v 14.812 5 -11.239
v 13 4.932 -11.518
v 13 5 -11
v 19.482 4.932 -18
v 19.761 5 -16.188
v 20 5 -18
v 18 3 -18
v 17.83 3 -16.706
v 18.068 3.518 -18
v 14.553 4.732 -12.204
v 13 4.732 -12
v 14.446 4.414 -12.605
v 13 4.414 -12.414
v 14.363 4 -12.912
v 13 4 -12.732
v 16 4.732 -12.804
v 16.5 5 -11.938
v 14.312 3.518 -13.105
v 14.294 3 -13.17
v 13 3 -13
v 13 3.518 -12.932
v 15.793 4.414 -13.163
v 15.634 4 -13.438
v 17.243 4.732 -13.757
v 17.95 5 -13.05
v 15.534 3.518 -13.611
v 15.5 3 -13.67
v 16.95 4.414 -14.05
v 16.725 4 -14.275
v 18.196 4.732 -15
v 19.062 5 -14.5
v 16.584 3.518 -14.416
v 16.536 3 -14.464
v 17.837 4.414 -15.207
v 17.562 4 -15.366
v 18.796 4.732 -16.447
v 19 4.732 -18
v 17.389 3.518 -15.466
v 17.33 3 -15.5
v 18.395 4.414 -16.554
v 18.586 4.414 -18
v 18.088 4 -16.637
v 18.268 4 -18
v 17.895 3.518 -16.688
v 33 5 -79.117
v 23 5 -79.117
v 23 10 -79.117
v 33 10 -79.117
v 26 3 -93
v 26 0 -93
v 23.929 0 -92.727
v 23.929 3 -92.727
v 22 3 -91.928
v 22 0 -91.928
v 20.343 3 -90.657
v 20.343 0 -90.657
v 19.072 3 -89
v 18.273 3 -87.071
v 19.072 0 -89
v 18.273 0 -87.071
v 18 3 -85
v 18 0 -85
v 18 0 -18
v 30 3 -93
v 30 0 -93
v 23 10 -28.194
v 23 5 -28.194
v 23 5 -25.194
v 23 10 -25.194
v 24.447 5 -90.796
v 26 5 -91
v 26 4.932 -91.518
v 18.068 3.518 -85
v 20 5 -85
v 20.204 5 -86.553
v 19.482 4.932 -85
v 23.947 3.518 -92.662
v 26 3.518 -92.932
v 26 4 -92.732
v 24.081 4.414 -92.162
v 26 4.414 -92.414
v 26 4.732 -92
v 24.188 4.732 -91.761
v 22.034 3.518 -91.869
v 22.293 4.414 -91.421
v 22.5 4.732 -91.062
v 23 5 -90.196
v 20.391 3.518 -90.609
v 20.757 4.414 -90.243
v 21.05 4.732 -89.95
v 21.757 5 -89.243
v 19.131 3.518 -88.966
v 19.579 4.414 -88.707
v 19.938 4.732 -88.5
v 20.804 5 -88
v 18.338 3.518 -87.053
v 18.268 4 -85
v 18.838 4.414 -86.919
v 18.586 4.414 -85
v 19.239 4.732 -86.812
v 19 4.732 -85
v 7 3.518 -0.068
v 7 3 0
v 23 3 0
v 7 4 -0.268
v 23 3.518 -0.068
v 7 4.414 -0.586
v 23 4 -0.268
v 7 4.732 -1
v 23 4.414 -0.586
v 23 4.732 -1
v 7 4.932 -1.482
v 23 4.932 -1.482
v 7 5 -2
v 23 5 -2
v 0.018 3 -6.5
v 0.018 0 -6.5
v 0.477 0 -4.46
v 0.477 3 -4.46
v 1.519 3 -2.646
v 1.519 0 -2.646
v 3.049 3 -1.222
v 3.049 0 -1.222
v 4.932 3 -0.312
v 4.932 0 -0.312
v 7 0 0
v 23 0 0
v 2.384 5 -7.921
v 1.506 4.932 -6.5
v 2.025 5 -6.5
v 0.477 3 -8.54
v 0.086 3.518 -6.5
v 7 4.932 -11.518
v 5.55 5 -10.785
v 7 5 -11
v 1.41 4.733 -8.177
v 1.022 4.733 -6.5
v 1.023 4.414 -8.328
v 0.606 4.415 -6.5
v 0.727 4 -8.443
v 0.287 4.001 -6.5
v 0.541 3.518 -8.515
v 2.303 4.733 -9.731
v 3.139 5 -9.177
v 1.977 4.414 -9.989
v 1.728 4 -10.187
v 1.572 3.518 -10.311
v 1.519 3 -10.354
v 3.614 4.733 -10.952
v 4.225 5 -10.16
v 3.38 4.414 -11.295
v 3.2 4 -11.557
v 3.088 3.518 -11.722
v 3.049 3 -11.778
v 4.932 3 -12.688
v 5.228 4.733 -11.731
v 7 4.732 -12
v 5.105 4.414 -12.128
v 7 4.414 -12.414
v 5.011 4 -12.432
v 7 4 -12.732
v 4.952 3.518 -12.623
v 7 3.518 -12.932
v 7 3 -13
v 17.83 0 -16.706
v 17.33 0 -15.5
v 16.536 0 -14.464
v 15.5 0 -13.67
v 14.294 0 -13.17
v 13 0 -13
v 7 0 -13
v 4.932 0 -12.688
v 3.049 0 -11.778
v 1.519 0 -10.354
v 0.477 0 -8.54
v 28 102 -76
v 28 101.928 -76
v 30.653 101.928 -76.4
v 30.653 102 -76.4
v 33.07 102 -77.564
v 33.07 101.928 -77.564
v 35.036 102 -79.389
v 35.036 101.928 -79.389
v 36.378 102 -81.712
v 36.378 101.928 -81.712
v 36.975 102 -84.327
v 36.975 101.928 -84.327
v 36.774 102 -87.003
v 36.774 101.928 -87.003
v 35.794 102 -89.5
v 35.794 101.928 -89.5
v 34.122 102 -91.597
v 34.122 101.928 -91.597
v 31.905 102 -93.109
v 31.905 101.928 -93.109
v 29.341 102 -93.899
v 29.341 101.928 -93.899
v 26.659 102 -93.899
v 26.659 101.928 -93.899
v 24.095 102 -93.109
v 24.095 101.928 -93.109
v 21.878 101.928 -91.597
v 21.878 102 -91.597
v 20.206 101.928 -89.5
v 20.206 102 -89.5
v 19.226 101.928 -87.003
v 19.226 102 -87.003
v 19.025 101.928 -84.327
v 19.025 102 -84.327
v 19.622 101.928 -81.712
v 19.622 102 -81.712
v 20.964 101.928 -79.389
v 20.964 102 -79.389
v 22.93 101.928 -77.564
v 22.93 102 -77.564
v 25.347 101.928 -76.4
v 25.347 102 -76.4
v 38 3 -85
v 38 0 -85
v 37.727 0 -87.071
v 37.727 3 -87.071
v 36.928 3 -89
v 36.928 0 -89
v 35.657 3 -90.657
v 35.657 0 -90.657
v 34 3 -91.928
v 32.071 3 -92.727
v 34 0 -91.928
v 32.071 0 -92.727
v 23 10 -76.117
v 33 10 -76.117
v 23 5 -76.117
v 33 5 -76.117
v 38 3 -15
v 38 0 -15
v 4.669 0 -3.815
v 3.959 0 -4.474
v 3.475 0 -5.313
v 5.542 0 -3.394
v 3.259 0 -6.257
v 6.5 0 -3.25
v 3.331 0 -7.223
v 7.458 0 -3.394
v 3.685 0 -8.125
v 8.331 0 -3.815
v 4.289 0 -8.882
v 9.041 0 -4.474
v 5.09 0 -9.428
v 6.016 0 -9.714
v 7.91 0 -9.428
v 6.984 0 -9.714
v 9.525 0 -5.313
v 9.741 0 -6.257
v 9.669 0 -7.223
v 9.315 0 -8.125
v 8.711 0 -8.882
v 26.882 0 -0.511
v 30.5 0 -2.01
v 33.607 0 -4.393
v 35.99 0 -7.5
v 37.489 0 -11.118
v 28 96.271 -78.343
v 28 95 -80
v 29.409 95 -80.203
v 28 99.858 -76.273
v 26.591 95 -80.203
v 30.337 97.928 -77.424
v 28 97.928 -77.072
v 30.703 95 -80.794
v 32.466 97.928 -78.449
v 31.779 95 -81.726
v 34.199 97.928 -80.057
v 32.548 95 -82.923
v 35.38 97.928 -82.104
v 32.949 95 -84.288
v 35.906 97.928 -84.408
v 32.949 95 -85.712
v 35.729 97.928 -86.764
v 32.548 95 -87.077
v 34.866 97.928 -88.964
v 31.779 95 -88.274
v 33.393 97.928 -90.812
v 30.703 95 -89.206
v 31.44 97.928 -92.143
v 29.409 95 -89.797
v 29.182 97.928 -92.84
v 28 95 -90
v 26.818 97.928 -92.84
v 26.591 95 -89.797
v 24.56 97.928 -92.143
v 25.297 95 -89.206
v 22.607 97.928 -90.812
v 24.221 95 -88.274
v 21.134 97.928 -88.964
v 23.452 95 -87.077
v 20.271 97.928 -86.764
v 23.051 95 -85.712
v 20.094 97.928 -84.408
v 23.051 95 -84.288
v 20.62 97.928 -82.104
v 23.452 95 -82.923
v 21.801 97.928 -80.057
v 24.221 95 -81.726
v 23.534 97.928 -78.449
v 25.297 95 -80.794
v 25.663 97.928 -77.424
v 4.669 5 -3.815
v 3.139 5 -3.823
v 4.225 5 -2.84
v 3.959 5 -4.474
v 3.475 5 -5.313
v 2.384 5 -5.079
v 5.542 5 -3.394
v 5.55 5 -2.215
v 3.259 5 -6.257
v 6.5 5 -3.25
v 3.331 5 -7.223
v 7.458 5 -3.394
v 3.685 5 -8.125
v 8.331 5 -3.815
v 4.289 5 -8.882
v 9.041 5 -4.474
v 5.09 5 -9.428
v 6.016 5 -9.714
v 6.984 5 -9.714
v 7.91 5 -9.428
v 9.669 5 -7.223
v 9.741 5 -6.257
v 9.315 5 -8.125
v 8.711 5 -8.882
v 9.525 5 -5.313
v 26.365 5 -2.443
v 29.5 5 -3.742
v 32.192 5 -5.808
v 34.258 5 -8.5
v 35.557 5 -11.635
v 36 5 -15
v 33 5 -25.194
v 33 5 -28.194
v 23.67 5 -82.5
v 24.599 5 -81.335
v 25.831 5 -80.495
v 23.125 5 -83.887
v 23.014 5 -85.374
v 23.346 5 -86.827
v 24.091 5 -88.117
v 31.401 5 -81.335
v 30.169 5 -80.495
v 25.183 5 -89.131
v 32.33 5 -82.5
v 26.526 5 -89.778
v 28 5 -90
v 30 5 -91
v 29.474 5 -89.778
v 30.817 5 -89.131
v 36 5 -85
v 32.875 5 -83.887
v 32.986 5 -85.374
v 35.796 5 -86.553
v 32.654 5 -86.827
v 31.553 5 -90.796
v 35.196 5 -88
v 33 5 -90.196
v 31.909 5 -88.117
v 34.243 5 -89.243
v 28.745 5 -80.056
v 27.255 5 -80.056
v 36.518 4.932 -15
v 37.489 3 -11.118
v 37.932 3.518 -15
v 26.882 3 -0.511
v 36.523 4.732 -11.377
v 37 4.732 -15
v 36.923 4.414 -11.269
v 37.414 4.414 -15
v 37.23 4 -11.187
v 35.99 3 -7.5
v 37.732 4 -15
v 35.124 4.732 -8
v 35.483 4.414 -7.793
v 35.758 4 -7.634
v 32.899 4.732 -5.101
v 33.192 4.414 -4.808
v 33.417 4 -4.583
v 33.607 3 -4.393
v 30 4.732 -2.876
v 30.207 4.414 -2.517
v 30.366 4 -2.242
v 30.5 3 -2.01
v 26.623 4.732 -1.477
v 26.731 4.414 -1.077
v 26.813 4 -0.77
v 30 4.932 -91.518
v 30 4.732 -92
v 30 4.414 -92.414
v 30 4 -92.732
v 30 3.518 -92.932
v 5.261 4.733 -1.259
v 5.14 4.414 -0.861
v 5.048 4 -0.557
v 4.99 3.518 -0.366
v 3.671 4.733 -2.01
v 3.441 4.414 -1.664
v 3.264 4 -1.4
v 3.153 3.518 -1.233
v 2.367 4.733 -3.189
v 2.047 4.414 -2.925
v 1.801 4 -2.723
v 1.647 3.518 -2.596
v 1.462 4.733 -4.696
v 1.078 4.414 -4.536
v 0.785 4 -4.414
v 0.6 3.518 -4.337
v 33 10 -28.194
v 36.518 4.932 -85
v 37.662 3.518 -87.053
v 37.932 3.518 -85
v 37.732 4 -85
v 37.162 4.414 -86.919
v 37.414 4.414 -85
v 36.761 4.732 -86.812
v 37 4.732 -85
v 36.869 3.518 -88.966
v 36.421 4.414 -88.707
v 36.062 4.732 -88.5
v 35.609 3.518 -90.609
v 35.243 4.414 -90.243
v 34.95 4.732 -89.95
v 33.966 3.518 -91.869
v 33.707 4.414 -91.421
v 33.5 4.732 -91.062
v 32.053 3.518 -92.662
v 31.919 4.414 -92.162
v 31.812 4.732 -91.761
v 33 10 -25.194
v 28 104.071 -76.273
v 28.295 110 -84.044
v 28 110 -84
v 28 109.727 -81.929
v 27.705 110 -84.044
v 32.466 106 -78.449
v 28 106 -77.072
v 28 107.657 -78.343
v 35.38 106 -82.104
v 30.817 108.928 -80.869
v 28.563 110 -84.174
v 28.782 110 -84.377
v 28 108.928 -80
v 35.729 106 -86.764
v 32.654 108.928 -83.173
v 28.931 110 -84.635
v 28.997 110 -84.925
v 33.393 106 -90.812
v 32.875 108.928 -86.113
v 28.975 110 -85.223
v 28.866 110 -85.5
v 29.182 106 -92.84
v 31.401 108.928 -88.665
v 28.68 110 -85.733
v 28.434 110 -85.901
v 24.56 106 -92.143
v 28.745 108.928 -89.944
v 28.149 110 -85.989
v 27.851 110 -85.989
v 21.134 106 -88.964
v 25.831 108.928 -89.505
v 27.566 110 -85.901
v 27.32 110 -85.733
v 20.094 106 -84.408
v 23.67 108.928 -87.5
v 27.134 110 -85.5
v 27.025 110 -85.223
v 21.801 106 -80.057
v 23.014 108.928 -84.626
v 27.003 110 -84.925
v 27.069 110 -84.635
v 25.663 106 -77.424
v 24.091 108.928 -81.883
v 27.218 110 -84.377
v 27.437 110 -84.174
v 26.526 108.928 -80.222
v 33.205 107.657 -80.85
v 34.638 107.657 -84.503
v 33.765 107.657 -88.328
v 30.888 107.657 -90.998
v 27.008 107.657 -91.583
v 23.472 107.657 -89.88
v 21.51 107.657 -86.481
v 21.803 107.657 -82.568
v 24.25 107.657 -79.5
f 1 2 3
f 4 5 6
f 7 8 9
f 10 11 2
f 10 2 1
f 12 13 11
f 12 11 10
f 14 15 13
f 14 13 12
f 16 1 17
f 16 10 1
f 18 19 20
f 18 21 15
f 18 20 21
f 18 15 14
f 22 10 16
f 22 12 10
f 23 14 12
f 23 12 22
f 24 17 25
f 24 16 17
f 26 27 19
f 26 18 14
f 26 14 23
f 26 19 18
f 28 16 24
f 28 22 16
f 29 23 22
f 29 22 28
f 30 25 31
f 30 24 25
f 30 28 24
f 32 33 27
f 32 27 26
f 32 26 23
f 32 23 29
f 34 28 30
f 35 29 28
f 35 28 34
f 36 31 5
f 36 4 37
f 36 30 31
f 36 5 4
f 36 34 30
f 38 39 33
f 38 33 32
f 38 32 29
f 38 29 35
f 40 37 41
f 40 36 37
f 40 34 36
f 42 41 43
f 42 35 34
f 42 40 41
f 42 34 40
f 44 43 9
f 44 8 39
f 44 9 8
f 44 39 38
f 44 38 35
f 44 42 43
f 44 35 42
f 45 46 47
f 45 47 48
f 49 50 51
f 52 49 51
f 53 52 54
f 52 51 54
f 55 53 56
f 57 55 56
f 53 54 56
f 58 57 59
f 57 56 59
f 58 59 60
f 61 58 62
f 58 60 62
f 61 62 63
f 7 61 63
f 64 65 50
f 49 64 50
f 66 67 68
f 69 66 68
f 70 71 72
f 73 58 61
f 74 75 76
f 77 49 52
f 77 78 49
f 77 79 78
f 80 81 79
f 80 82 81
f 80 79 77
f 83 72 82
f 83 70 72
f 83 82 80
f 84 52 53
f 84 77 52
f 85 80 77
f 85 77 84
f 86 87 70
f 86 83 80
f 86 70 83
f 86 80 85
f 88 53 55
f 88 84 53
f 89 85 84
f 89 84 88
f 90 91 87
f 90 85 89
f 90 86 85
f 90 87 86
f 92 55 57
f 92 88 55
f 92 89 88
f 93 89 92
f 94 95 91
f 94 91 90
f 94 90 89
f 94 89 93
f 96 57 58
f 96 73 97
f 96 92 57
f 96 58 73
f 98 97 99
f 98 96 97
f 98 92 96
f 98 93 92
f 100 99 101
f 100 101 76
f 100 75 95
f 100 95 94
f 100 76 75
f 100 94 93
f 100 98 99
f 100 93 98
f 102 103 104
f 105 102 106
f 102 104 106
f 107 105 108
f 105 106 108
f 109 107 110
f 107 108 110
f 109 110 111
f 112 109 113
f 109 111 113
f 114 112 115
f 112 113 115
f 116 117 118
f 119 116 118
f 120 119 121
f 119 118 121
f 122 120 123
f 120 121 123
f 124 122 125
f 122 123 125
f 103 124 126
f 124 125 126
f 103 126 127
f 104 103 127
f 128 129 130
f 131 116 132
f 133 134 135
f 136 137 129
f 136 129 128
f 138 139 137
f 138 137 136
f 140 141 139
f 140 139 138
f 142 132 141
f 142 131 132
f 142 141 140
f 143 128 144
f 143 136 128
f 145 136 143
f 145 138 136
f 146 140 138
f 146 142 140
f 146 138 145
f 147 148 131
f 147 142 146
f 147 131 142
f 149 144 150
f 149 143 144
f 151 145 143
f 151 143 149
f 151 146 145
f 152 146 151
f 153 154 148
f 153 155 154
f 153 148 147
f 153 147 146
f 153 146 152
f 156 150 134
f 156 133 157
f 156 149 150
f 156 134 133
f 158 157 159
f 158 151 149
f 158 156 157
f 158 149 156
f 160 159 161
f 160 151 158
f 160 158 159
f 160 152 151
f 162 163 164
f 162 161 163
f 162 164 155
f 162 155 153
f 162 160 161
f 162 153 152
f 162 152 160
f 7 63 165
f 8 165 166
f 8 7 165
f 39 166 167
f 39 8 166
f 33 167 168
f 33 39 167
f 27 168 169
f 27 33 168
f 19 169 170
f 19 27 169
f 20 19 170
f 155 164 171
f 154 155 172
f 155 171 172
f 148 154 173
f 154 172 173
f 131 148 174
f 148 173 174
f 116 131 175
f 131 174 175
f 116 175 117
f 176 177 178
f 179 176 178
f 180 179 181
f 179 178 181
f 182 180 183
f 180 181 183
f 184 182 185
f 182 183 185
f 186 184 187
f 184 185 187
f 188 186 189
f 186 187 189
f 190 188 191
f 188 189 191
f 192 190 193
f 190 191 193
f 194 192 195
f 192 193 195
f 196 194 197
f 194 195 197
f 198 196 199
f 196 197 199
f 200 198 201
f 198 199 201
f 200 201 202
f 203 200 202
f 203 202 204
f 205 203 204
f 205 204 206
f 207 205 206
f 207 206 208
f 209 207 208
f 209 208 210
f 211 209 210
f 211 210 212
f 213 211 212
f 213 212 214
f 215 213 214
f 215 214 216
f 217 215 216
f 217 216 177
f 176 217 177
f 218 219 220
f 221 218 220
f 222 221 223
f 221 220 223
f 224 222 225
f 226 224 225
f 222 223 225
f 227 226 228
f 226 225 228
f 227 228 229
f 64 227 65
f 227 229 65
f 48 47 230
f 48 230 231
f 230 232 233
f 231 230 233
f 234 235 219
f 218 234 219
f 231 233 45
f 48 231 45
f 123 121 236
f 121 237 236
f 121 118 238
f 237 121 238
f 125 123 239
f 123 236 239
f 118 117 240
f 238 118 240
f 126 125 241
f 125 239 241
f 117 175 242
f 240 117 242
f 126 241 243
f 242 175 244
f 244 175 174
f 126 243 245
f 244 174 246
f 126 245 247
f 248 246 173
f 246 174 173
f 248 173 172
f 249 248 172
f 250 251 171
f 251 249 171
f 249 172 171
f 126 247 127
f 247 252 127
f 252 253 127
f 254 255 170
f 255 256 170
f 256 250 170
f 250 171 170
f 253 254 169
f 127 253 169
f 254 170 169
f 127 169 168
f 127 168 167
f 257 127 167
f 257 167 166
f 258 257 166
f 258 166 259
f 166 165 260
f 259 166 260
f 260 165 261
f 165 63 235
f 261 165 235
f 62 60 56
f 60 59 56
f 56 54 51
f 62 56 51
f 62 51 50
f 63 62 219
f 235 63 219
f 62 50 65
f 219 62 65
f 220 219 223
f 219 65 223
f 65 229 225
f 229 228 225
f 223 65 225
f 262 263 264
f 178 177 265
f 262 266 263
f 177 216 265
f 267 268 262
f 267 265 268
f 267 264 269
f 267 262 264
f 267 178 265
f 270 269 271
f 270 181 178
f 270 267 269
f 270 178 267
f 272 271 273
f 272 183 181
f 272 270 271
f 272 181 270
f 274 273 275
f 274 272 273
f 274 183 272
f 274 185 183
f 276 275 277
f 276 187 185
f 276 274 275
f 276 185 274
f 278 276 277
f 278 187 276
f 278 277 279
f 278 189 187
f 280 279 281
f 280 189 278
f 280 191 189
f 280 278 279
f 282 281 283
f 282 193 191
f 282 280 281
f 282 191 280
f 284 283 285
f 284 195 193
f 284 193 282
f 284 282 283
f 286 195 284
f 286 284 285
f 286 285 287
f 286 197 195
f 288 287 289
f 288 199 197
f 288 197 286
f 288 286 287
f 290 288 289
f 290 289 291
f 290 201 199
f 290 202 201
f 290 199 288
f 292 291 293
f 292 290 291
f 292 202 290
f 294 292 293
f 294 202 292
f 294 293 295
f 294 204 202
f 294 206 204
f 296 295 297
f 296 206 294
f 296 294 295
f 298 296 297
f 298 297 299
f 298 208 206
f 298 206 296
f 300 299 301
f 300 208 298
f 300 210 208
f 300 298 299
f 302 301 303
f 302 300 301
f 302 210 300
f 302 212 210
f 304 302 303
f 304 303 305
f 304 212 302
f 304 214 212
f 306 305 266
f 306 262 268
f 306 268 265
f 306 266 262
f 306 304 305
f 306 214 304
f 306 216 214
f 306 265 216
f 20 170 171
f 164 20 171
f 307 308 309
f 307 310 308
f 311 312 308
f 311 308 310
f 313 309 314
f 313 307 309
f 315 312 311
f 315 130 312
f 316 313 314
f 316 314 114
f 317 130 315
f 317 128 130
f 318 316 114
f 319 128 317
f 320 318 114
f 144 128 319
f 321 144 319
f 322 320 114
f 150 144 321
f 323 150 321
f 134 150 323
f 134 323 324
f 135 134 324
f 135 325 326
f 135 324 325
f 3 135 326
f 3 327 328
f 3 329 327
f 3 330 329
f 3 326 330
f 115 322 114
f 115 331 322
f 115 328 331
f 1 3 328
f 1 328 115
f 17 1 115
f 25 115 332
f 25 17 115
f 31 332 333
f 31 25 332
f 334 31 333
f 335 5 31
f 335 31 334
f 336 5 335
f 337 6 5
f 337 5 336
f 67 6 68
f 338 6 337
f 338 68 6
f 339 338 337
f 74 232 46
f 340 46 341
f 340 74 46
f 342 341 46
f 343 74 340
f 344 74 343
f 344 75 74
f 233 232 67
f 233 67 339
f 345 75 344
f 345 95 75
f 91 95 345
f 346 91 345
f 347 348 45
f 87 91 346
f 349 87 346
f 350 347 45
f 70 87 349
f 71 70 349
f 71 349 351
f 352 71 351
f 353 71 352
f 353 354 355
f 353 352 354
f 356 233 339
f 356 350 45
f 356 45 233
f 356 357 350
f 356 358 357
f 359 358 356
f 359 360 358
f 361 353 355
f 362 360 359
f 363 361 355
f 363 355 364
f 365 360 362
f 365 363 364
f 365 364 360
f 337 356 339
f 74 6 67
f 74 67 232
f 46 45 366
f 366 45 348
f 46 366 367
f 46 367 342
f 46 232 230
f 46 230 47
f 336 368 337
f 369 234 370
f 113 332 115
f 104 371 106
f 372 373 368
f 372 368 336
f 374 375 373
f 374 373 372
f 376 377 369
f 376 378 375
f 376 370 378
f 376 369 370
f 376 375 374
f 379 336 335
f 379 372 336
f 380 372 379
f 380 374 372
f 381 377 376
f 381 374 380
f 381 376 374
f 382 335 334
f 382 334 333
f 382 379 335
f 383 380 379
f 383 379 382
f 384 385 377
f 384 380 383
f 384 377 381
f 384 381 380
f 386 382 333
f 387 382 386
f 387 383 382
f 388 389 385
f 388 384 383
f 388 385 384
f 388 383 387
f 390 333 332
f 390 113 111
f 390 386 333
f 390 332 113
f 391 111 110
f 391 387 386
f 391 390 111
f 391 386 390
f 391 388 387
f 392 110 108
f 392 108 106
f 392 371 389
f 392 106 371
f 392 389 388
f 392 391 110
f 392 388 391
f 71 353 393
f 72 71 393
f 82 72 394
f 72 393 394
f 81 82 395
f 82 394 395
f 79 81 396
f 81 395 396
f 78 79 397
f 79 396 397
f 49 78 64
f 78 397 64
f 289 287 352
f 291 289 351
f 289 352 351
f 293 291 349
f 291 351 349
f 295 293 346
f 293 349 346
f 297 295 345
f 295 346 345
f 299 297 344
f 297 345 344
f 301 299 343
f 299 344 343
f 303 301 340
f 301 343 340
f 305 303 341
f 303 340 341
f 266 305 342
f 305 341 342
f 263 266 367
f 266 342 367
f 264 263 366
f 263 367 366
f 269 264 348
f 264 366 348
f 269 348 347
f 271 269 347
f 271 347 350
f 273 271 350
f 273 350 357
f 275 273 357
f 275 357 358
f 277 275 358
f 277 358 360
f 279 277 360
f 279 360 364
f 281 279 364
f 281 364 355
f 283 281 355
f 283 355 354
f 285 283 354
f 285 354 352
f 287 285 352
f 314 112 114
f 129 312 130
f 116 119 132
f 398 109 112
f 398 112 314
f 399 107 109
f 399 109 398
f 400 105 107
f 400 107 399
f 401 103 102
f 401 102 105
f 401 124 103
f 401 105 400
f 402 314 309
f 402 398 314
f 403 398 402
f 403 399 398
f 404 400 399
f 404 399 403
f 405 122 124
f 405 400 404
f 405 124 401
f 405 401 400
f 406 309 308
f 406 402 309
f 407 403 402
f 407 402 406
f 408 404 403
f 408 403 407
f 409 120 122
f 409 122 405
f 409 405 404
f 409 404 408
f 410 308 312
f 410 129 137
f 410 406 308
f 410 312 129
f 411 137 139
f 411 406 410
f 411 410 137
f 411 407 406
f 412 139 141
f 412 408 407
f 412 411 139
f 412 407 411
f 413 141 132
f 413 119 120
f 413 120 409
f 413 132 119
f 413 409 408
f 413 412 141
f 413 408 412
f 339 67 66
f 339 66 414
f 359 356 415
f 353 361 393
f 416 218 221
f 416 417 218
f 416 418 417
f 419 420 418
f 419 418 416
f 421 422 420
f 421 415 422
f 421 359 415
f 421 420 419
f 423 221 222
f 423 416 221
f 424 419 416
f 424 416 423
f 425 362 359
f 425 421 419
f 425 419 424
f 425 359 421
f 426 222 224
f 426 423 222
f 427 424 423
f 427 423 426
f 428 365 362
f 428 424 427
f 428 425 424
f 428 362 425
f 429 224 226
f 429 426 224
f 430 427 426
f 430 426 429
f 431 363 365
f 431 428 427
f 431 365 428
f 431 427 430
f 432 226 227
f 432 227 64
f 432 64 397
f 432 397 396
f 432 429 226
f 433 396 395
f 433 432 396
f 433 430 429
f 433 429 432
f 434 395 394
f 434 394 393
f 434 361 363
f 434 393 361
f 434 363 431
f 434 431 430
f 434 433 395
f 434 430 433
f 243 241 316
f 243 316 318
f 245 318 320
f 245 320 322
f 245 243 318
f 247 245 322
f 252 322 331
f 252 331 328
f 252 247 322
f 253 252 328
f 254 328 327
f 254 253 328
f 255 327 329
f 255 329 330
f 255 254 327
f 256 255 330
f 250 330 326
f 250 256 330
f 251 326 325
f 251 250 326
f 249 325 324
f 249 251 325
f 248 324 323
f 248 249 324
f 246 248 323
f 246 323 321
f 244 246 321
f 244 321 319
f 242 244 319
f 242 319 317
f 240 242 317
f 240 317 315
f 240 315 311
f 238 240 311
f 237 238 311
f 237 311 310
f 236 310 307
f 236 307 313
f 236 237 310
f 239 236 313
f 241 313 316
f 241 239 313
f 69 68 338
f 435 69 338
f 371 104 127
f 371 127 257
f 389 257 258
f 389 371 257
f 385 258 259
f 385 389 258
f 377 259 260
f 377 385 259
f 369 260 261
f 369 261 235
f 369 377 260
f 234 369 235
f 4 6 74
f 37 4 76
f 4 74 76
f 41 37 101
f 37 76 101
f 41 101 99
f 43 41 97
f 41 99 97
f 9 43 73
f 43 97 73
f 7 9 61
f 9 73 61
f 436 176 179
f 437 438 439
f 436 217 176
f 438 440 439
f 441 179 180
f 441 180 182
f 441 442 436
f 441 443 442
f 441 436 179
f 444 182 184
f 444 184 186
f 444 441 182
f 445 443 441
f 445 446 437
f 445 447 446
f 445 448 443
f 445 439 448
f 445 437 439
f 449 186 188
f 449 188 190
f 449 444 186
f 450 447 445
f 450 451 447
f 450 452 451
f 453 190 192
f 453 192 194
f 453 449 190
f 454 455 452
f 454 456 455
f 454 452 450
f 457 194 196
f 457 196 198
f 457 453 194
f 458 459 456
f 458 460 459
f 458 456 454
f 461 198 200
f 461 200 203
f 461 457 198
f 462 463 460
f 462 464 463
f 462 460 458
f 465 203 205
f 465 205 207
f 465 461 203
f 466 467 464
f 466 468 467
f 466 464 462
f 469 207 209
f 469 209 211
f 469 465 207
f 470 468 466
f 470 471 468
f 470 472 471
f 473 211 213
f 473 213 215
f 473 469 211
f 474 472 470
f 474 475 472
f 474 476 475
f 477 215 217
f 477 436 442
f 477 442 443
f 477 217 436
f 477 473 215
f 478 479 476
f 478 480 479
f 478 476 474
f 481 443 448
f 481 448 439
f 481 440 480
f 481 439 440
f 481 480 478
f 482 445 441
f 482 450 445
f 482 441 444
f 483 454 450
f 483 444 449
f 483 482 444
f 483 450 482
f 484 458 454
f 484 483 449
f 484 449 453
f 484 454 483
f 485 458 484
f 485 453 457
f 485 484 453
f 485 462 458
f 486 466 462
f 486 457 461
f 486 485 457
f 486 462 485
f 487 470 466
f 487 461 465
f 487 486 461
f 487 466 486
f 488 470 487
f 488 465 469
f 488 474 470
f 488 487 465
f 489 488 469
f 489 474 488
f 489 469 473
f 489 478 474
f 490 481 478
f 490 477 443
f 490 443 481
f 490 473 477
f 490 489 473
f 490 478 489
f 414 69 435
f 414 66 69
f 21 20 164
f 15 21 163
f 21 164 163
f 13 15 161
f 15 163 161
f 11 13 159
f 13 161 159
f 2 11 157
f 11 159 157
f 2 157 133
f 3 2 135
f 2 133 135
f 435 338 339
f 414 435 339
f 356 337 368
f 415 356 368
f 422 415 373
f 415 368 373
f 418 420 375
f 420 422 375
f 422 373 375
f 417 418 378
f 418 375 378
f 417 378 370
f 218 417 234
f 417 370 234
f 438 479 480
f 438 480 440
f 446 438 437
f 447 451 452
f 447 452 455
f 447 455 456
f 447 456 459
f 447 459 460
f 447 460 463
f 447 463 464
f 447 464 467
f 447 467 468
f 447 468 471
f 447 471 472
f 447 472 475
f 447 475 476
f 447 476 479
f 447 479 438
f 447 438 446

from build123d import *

# Parameters (mm, degrees)
SKETCH2_W           = 13
SKETCH2_H           = 13
SKETCH2_R           = 3.25
BOSS_EXTRUDE2_DEPTH = 5
FILLET1_R           = 15
FILLET2_R           = 5
FILLET3_R           = 7
FILLET4_R           = 2
FILLET5_R           = 8
SKETCH4_R           = 5
BOSS_EXTRUDE4_DEPTH = 90
SKETCH5_R           = 9
BOSS_EXTRUDE5_DEPTH = 15
FILLET6_R           = 8
SKETCH6_W           = 10
SKETCH6_H           = 1.5
BOSS_EXTRUDE6_DEPTH = 5
SKETCH7_W           = 10
SKETCH7_H           = 3
BOSS_EXTRUDE7_DEPTH = 5


with BuildPart() as part:
    # Sketch2 → Boss-Extrude2 (new body)
    # profile 1 of 2: a face of its own
    with BuildSketch(Plane(origin=(0, 0, 0), x_dir=(1, 0, 0), z_dir=(0, 1, 0))):
        with Locations((6.5, 6.5)):
            Rectangle(SKETCH2_W, SKETCH2_H)
        with Locations(Location((6.5, 6.5, 0), (0, 0, 270))):
            Circle(SKETCH2_R, mode=Mode.SUBTRACT)
    # profile 2 of 2: a face of its own
    with BuildSketch(Plane(origin=(0, 0, 0), x_dir=(1, 0, 0), z_dir=(0, 1, 0))):
        Polygon((13, 13), (13, 0), (38, 0), (38, 93), (18, 93), (18, 13), align=None)
    extrude(amount=BOSS_EXTRUDE2_DEPTH)

    # Fillet1
    fillet1_edges = [part.edges().sort_by_distance(p)[0] for p in [
        (38, 2.5, 0),
    ]]
    fillet(fillet1_edges, radius=FILLET1_R)

    # Fillet2
    fillet2_edges = [part.edges().sort_by_distance(p)[0] for p in [
        (18, 2.5, -13),
    ]]
    fillet(fillet2_edges, radius=FILLET2_R)

    # Fillet3
    # the kernel refuses this fillet: 7 mm, written as the material it takes off along each edge
    with BuildSketch(Plane(origin=(0, -17.5, 0), x_dir=(0, 0, -1), z_dir=(0, 1, 0)), Plane(origin=(0, -17.5, -13), x_dir=(1, 0, 0), z_dir=(0, 1, 0))) as fillet3_piece_1:
        with BuildLine():
            CenterArc((FILLET3_R, -FILLET3_R), FILLET3_R, 90, 90)
            Line((0, -FILLET3_R), (0, 0))
            Line((0, 0), (FILLET3_R, 0))
        make_face()
    extrude(amount=40, mode=Mode.SUBTRACT)

    # Fillet4
    # the kernel refuses this fillet: 2 mm, written as the material it takes off along each edge
    with BuildSketch(Plane(origin=(43, 5, -93), x_dir=(0, 0, 1), z_dir=(-1, 0, 0))) as fillet4_piece_1:
        with BuildLine():
            CenterArc((FILLET4_R, -FILLET4_R), FILLET4_R, 90, 90)
            Line((0, -FILLET4_R), (0, 0))
            Line((0, 0), (FILLET4_R, 0))
        make_face()
    extrude(amount=30, mode=Mode.SUBTRACT)
    with BuildSketch(Plane(origin=(18, 5, -98), x_dir=(1, 0, 0), z_dir=(0, 0, 1))) as fillet4_piece_2:
        with BuildLine():
            CenterArc((FILLET4_R, -FILLET4_R), FILLET4_R, 90, 90)
            Line((0, -FILLET4_R), (0, 0))
            Line((0, 0), (FILLET4_R, 0))
        make_face()
    extrude(amount=80, mode=Mode.SUBTRACT)
    with BuildSketch(Plane(origin=(38, 5, -15), x_dir=(-1, 0, 0), z_dir=(0, 0, -1))) as fillet4_piece_3:
        with BuildLine():
            CenterArc((FILLET4_R, -FILLET4_R), FILLET4_R, 90, 90)
            Line((0, -FILLET4_R), (0, 0))
            Line((0, 0), (FILLET4_R, 0))
        make_face()
    extrude(amount=83, mode=Mode.SUBTRACT)
    with BuildSketch(Plane(origin=(23, 5, -15), x_dir=(1, 0, 0), z_dir=(0, 0, -1))) as fillet4_piece_4:
        with BuildLine():
            CenterArc((15 - FILLET4_R, FILLET4_R), FILLET4_R, 270, 90)
            Line((15, FILLET4_R), (15, 0))
            Line((15, 0), (15 - FILLET4_R, 0))
        make_face()
    revolve(axis=Axis((23, 5, -15), (0, -1, 0)), revolution_arc=90, mode=Mode.SUBTRACT)
    with BuildSketch(Plane(origin=(13, 5, -18), x_dir=(0, 0, 1), z_dir=(-1, 0, 0))) as fillet4_piece_5:
        with BuildLine():
            CenterArc((5 + FILLET4_R, -FILLET4_R), FILLET4_R, 90, 90)
            Line((5, -FILLET4_R), (5, 0))
            Line((5, 0), (5 + FILLET4_R, 0))
        make_face()
    revolve(axis=Axis((13, 5, -18), (0, 1, 0)), revolution_arc=90, mode=Mode.SUBTRACT)
    with BuildSketch(Plane(origin=(23, 5, 0), x_dir=(0, 0, -1), z_dir=(-1, 0, 0))) as fillet4_piece_6:
        with BuildLine():
            CenterArc((FILLET4_R, FILLET4_R), FILLET4_R, 180, 90)
            Line((0, FILLET4_R), (0, 0))
            Line((0, 0), (FILLET4_R, 0))
        make_face()
    extrude(amount=16, mode=Mode.SUBTRACT)
    with BuildSketch(Plane(origin=(7, 5, -13), x_dir=(0, 0, 1), z_dir=(1, 0, 0))) as fillet4_piece_7:
        with BuildLine():
            CenterArc((FILLET4_R, FILLET4_R), FILLET4_R, 180, 90)
            Line((0, FILLET4_R), (0, 0))
            Line((0, 0), (FILLET4_R, 0))
        make_face()
    extrude(amount=6, mode=Mode.SUBTRACT)
    with BuildSketch(Plane(origin=(7, 5, -6), x_dir=(-0.8002659852705738, 0, 0.5996451891067899), z_dir=(0.5996451891067899, 0, 0.8002659852705738))) as fillet4_piece_8:
        with BuildLine():
            CenterArc((7 - FILLET4_R, FILLET4_R), FILLET4_R, 270, 90)
            Line((7, FILLET4_R), (7, 0))
            Line((7, 0), (7 - FILLET4_R, 0))
        make_face()
    revolve(axis=Axis((7, 5, -6), (0, -1, 0)), revolution_arc=126.844490412, mode=Mode.SUBTRACT)
    with BuildSketch(Plane(origin=(7, 5, -7), x_dir=(0, 0, 1), z_dir=(1, 0, 0))) as fillet4_piece_9:
        with BuildLine():
            CenterArc((7 - FILLET4_R, FILLET4_R), FILLET4_R, 270, 90)
            Line((7, FILLET4_R), (7, 0))
            Line((7, 0), (7 - FILLET4_R, 0))
        make_face()
    revolve(axis=Axis((7, 5, -7), (0, -1, 0)), revolution_arc=126.844490412, mode=Mode.SUBTRACT)

    # Fillet5
    # the kernel refuses this fillet: 8 mm, written as the material it takes off along each edge
    with BuildSketch(Plane(origin=(26, 5, -85), x_dir=(0, 0, -1), z_dir=(1, 0, 0))) as fillet5_piece_1:
        with BuildLine():
            CenterArc((6, -2), 2, 0, 90)
            Line((8, -2), (8, 0))
            Line((8, 0), (6, 0))
        make_face()
    revolve(axis=Axis((26, 5, -85), (0, 1, 0)), revolution_arc=90, mode=Mode.SUBTRACT)
    with BuildSketch(Plane(origin=(30, 5, -85), x_dir=(1, 0, 0), z_dir=(0, 0, 1))) as fillet5_piece_2:
        with BuildLine():
            CenterArc((6, -2), 2, 0, 90)
            Line((8, -2), (8, 0))
            Line((8, 0), (6, 0))
        make_face()
    revolve(axis=Axis((30, 5, -85), (0, 1, 0)), revolution_arc=90, mode=Mode.SUBTRACT)
    with BuildSketch(Plane(origin=(38, -20, -93), x_dir=(-1, 0, 0), z_dir=(0, 1, 0)), Plane(origin=(18, -20, -93), x_dir=(0, 0, 1), z_dir=(0, 1, 0))) as fillet5_piece_3:
        with BuildLine():
            CenterArc((FILLET5_R, FILLET5_R), FILLET5_R, 180, 90)
            Line((0, FILLET5_R), (0, 0))
            Line((0, 0), (FILLET5_R, 0))
        make_face()
    extrude(amount=25, mode=Mode.SUBTRACT)

    # Sketch4 → Boss-Extrude4 (add)
    with BuildSketch(Plane(origin=(0, 5, 0), x_dir=(1, 0, 0), z_dir=(0, 1, 0))):
        with Locations(Location((28, 85, 0), (0, 0, 90))):
            Circle(SKETCH4_R)
    extrude(amount=BOSS_EXTRUDE4_DEPTH)

    # Sketch5 → Boss-Extrude5 (add)
    with BuildSketch(Plane(origin=(0, 95, 0), x_dir=(1, 0, 0), z_dir=(0, 1, 0))):
        with Locations(Location((28, 85, 0), (0, 0, 270))):
            Circle(SKETCH5_R)
    extrude(amount=BOSS_EXTRUDE5_DEPTH)

    # Fillet6
    # the kernel refuses this fillet: 8 mm, written as the material it takes off along each edge
    with BuildSketch(Plane(origin=(28, 95, -85), x_dir=(0, 0, 1), z_dir=(-1, 0, 0))) as fillet6_piece_1:
        with BuildLine():
            CenterArc((1, 6.92820323), FILLET6_R, 300, 60)
            Line((5, 0), (5.08, -0.138564065))
            ThreePointArc((5.08, -0.138564065), (7, -0.16), (9, -0.16))
            Line((9, -0.16), (9.16, 0))
            Line((9.16, 0), (9.16, 6.92820323))
            Line((9.16, 6.92820323), (9, 6.92820323))
        make_face()
    revolve(axis=Axis((28, 95, -85), (0, 1, 0)), mode=Mode.SUBTRACT)
    with BuildSketch(Plane(origin=(28, 110, -85), x_dir=(0, 0, 1), z_dir=(-1, 0, 0))) as fillet6_piece_2:
        with BuildLine():
            CenterArc((9 - FILLET6_R, -FILLET6_R), FILLET6_R, 0, 90)
            Line((9 - FILLET6_R, 0), (9 - FILLET6_R, FILLET6_R * 0.02))
            Line((9 - FILLET6_R, FILLET6_R * 0.02), (9 + FILLET6_R * 0.02, FILLET6_R * 0.02))
            Line((9 + FILLET6_R * 0.02, FILLET6_R * 0.02), (9 + FILLET6_R * 0.02, -FILLET6_R))
            Line((9 + FILLET6_R * 0.02, -FILLET6_R), (9, -FILLET6_R))
        make_face()
    revolve(axis=Axis((28, 110, -85), (0, 1, 0)), mode=Mode.SUBTRACT)

    # Sketch6 → Boss-Extrude6 (add)
    with BuildSketch(Plane(origin=(0, 5, 0), x_dir=(1, 0, 0), z_dir=(0, 1, 0))):
        with Locations((28, 25.944405325)):
            Rectangle(SKETCH6_W, SKETCH6_H)
        with Locations((28, 27.444405325)):
            Rectangle(SKETCH6_W, SKETCH6_H)
    extrude(amount=BOSS_EXTRUDE6_DEPTH)

    # Sketch7 → Boss-Extrude7 (add)
    with BuildSketch(Plane(origin=(0, 5, 0), x_dir=(1, 0, 0), z_dir=(0, 1, 0))):
        with Locations((28, 77.6172361)):
            Rectangle(SKETCH7_W, SKETCH7_H)
    extrude(amount=BOSS_EXTRUDE7_DEPTH)


solid = part.part
